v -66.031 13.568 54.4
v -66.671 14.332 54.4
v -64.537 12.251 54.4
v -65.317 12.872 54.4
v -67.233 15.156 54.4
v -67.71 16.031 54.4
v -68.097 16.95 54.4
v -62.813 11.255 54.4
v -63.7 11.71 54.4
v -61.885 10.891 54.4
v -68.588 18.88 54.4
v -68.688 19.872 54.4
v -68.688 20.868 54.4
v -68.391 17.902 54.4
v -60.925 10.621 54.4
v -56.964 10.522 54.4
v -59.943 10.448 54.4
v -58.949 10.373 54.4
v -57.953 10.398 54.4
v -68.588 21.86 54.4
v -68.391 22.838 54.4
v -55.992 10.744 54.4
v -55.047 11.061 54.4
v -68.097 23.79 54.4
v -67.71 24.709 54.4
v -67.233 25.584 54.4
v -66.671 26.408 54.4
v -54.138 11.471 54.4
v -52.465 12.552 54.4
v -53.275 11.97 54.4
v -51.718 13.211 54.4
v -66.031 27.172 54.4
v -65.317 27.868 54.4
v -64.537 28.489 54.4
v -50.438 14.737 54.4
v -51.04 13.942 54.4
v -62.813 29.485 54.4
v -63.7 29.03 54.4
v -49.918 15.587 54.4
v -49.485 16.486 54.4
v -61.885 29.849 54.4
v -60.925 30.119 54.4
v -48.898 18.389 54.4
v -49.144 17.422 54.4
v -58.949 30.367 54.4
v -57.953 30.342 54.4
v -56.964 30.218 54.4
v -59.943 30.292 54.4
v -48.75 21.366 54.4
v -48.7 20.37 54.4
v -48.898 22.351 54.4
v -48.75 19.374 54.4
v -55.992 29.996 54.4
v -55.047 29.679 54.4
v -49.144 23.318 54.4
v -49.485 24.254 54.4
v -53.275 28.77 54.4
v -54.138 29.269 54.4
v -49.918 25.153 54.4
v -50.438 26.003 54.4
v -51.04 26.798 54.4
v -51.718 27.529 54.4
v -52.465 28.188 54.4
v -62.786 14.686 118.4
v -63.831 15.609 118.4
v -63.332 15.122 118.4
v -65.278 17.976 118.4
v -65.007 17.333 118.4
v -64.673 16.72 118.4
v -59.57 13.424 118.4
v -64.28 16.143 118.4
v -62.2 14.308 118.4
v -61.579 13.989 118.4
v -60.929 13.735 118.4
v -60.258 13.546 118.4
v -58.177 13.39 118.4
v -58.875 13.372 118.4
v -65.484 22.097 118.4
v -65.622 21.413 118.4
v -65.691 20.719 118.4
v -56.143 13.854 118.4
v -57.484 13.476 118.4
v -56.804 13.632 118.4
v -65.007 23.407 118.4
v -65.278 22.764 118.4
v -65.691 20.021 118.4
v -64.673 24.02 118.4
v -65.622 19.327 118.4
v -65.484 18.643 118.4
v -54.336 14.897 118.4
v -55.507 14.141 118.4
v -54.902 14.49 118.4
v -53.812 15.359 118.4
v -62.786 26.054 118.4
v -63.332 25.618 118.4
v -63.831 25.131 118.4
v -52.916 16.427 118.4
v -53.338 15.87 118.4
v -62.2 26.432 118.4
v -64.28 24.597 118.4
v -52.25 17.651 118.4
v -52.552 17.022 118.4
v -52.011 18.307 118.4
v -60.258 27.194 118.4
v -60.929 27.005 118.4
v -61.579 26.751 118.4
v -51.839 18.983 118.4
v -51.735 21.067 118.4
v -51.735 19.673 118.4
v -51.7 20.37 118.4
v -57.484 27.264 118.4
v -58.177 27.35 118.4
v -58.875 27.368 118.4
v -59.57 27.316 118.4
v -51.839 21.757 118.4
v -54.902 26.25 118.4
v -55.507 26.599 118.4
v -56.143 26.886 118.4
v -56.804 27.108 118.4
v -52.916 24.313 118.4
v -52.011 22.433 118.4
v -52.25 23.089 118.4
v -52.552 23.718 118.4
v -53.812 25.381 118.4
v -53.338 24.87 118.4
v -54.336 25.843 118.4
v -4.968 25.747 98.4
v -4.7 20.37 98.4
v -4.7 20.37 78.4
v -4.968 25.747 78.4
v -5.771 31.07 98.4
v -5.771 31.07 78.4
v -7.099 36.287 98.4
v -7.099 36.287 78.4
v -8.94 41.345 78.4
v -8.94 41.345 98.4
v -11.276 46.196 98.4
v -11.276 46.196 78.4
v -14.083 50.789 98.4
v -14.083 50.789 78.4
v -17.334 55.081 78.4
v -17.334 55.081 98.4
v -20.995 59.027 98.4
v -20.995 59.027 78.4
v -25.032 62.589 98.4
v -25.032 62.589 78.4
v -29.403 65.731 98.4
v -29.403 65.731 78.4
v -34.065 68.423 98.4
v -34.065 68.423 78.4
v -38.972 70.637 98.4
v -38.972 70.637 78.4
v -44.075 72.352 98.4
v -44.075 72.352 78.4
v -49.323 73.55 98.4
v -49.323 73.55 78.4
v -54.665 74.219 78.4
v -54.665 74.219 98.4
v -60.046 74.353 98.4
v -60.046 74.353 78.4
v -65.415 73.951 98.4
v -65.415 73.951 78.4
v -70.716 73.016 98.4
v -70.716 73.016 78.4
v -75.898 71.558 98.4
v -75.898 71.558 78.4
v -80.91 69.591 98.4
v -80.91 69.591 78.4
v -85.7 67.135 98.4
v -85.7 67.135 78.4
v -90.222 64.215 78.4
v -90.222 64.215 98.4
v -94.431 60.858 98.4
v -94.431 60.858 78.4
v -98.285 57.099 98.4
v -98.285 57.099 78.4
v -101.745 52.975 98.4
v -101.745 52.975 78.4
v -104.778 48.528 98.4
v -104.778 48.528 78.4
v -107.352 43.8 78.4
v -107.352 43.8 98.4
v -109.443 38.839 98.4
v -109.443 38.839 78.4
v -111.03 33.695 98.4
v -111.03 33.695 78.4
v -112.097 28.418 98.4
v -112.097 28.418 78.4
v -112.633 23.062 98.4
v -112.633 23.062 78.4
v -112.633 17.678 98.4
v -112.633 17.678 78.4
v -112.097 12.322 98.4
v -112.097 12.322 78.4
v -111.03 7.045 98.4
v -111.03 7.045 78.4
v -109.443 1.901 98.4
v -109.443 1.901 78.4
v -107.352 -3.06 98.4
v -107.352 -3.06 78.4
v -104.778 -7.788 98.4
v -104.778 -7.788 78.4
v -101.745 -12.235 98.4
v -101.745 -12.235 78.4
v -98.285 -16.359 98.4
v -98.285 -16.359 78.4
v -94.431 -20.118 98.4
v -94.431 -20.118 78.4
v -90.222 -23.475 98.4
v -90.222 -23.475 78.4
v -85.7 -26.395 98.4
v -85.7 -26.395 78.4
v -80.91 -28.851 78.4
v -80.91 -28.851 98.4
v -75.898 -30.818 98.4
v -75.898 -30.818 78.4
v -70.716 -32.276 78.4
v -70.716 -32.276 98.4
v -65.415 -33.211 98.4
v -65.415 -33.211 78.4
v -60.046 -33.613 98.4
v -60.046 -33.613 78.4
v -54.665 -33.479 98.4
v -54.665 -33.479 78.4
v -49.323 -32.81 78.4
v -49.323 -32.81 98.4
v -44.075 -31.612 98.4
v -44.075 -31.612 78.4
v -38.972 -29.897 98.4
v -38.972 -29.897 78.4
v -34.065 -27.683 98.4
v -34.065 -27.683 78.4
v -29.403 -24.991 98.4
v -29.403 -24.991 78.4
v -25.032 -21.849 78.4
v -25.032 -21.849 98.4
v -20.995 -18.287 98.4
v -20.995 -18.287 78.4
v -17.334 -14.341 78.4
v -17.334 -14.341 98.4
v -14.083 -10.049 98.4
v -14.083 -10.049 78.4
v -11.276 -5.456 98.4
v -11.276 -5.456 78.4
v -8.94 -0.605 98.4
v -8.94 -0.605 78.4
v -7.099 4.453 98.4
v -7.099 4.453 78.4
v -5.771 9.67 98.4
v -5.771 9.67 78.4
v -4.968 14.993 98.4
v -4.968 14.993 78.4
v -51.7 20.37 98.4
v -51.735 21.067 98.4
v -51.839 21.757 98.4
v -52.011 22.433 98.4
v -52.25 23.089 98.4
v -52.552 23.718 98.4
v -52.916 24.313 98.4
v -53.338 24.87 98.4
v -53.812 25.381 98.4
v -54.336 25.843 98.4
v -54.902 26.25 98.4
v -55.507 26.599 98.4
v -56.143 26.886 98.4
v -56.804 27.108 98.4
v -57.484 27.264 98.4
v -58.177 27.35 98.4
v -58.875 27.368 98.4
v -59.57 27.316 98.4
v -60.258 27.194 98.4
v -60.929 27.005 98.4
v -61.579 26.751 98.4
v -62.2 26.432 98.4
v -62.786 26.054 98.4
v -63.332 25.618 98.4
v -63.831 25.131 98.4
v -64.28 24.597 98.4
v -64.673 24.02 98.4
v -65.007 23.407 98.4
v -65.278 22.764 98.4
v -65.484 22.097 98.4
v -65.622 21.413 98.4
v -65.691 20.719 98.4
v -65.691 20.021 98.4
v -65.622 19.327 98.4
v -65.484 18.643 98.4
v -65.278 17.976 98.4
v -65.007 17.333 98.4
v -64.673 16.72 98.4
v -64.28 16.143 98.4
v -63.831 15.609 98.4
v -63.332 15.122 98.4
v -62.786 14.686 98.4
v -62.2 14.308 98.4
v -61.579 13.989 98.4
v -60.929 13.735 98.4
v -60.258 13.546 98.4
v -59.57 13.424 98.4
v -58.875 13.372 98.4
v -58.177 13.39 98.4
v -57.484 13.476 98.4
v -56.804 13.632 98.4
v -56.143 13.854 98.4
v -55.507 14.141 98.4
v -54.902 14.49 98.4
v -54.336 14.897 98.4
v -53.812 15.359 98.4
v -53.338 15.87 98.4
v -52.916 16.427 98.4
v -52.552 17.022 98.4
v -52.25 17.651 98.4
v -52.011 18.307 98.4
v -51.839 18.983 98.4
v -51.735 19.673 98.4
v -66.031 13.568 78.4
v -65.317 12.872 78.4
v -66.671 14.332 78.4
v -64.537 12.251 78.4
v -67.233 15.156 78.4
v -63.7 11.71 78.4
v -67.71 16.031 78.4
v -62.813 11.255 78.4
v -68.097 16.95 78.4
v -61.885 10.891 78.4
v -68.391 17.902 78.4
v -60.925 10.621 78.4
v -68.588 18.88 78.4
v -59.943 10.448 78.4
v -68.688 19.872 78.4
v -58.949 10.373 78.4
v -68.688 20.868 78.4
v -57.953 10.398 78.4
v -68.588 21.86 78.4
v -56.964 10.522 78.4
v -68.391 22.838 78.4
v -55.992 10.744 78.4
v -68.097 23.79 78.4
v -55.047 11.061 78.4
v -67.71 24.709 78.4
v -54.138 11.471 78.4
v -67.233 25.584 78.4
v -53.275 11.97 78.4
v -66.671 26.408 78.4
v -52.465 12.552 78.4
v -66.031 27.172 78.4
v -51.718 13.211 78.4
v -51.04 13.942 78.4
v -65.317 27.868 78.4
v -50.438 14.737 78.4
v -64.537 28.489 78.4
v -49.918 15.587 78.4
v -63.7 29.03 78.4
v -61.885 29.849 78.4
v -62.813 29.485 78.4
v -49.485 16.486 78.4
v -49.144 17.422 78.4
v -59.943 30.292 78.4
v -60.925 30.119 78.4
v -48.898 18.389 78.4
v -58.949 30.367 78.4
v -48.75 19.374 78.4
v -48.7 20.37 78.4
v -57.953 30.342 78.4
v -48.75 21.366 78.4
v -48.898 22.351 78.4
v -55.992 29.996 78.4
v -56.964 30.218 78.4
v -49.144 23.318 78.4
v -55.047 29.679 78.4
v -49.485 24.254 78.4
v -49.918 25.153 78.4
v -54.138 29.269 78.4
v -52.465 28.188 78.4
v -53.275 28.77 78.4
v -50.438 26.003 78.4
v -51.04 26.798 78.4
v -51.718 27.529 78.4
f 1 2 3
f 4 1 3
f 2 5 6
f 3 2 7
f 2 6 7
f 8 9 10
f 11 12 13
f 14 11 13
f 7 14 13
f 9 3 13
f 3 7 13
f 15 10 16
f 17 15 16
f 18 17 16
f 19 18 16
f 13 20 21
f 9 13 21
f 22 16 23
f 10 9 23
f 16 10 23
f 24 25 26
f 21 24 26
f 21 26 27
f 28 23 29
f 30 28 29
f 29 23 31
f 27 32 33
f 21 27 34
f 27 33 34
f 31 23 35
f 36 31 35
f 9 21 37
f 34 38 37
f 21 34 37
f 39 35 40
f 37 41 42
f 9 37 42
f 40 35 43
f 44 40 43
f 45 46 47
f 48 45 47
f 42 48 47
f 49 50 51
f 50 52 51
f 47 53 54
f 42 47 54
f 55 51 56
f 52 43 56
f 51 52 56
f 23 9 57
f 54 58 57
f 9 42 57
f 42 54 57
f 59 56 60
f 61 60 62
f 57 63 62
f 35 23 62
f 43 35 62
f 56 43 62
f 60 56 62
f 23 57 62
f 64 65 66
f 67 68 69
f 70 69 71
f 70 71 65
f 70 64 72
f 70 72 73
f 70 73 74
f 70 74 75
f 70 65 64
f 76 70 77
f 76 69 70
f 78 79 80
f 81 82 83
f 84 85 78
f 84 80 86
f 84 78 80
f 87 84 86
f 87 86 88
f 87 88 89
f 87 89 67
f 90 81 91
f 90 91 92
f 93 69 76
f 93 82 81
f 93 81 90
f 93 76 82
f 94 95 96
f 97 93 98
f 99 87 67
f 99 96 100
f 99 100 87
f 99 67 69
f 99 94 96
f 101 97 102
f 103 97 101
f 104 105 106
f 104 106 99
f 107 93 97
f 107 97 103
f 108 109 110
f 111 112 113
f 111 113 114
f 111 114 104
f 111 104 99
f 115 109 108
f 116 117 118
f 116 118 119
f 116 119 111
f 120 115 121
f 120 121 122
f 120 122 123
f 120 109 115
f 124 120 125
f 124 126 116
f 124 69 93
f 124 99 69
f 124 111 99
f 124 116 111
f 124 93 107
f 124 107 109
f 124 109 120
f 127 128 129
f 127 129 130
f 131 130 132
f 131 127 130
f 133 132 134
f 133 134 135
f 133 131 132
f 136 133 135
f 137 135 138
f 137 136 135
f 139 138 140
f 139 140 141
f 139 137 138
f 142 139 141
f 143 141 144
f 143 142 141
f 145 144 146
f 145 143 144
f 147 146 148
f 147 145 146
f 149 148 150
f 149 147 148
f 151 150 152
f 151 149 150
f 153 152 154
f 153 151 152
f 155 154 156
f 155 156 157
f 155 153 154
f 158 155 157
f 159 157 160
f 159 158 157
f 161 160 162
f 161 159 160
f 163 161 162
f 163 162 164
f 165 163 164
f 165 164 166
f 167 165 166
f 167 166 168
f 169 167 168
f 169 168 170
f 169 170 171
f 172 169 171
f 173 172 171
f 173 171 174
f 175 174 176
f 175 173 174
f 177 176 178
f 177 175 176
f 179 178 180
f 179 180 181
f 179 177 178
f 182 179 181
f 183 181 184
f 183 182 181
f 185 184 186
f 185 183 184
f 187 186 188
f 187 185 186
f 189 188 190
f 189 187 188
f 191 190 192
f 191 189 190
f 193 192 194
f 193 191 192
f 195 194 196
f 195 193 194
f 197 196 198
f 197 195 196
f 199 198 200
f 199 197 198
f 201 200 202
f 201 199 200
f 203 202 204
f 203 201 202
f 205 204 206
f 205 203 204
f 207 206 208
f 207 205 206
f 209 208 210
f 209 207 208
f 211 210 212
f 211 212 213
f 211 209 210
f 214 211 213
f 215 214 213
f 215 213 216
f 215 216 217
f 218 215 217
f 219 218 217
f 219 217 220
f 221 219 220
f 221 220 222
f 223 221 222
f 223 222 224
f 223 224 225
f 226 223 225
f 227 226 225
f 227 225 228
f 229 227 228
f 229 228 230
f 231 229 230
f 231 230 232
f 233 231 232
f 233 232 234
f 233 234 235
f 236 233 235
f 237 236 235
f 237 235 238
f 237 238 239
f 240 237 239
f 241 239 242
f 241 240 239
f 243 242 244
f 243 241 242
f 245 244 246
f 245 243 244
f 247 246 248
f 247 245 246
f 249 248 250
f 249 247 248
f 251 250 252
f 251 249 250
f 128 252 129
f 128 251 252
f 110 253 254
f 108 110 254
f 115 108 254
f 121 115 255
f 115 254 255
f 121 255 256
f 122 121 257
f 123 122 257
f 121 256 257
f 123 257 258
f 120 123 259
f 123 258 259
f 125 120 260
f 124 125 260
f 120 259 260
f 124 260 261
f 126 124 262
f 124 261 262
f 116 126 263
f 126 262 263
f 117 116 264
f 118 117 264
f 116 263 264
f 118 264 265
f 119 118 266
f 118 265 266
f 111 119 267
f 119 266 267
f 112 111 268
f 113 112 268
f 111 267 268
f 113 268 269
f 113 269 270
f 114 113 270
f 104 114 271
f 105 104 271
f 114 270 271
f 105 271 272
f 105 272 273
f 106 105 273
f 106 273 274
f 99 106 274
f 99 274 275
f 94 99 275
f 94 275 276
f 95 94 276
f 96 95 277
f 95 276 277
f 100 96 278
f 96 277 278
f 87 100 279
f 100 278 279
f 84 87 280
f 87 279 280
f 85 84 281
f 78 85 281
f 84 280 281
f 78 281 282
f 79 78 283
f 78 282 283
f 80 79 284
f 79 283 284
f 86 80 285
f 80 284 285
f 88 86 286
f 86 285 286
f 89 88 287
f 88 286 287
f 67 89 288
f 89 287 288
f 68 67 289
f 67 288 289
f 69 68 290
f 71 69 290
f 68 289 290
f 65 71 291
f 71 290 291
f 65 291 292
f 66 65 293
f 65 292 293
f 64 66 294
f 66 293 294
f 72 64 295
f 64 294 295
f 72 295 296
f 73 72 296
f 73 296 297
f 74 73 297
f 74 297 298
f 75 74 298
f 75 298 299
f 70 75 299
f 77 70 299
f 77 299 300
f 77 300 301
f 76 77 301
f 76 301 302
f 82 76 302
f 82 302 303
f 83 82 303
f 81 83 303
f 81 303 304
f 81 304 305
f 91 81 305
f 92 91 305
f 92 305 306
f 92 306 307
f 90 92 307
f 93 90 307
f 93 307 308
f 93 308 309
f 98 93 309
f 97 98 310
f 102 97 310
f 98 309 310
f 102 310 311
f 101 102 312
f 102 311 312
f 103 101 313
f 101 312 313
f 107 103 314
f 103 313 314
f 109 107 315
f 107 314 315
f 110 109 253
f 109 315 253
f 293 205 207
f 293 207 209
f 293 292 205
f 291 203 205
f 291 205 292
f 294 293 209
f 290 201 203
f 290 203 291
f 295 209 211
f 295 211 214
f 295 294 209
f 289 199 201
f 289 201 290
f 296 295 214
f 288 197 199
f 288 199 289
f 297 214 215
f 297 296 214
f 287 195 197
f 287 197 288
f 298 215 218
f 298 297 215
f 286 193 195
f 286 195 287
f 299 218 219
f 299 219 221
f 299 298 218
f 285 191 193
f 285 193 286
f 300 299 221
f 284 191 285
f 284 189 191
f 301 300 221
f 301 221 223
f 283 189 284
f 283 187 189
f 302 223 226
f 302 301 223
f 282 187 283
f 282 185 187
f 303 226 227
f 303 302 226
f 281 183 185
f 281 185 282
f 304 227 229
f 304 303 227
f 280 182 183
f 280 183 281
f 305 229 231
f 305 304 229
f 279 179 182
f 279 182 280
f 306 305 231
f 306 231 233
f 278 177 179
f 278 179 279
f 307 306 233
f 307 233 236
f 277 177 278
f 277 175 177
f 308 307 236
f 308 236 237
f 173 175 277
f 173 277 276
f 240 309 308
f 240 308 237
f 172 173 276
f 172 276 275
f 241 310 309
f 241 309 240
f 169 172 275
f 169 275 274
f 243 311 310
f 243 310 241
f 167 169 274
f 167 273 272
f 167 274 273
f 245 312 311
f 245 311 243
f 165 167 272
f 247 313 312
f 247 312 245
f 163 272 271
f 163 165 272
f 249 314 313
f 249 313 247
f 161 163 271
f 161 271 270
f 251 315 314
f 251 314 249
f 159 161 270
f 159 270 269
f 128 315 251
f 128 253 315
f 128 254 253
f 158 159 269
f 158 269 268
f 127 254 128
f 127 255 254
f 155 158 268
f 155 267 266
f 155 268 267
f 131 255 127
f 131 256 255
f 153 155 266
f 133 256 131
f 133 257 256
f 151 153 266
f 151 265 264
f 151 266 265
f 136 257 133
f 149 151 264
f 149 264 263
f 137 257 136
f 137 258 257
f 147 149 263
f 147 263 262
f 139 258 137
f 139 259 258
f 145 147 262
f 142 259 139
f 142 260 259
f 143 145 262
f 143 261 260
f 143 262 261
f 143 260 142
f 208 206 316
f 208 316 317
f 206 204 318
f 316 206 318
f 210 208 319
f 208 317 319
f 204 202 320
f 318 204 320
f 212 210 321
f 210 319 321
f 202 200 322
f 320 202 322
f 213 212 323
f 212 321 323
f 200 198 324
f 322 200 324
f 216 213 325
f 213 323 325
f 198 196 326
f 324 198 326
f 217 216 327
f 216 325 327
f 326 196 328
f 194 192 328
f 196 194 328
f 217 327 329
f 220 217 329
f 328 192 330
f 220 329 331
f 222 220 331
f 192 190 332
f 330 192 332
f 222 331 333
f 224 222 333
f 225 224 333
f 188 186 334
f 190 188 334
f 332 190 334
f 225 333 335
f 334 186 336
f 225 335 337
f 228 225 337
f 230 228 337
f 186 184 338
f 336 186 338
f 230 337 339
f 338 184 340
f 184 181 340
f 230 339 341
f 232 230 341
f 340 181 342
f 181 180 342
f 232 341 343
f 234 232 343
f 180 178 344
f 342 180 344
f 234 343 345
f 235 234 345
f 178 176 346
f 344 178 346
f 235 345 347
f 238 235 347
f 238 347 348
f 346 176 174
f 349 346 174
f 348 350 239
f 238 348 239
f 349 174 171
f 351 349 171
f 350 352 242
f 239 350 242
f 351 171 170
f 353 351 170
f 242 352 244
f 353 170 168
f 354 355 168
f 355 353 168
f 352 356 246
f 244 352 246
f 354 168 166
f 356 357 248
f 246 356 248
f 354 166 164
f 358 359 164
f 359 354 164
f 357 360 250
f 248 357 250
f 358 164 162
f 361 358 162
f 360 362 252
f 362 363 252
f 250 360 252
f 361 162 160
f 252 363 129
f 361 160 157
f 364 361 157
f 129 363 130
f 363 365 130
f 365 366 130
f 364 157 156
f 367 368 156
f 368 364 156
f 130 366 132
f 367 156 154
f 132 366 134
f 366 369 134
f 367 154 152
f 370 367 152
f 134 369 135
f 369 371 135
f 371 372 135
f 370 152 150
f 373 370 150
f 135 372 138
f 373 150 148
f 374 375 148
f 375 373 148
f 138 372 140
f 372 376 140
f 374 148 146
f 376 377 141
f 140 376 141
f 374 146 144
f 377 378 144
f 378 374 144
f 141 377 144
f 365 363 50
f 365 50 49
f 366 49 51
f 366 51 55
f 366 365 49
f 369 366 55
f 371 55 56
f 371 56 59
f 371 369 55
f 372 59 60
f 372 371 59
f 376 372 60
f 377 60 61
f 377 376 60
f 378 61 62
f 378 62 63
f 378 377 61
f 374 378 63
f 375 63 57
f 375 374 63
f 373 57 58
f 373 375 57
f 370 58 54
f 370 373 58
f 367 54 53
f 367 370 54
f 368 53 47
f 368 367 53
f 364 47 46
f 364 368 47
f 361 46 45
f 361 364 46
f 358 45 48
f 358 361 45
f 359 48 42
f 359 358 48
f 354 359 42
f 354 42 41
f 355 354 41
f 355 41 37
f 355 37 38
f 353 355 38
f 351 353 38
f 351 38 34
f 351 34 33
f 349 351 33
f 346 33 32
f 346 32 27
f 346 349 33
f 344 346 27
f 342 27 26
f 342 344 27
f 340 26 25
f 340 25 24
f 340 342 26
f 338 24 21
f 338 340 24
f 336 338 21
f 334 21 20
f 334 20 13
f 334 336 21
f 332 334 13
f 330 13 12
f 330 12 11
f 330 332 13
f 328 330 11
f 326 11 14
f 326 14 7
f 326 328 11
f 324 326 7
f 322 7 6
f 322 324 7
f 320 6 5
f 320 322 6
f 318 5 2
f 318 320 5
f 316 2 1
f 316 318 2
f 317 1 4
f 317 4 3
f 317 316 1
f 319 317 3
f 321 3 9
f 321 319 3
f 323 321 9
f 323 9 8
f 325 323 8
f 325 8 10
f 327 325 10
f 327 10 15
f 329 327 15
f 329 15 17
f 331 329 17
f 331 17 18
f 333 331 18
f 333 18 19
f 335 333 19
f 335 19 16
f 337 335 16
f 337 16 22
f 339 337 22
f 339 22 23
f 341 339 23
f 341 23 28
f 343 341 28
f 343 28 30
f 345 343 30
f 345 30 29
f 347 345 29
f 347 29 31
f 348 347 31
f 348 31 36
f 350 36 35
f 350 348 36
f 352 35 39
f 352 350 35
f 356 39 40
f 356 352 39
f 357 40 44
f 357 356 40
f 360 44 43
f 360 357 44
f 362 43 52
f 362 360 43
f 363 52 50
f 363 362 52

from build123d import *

# Parameters (mm, degrees)
SKETCH004_R           = 54
EXTRUDE004_DEPTH      = 20
SKETCH003_R           = 10
EXTRUDE003_DEPTH      = 30
EXTRUDE003_DEPTH_BACK = 14
SKETCH005_R           = 7
EXTRUDE005_DEPTH      = 20


with BuildPart() as outercylinder:
    # Sketch004 (on Face3 of Extrude003) → Extrude004 (new body)
    with BuildSketch(Plane.XY.offset(98.4)):
        with Locations((-58.7, 20.37)):
            Circle(SKETCH004_R)
    extrude(amount=-EXTRUDE004_DEPTH)


with BuildPart() as innercylinder:
    # Sketch003 (on Face4 of Extrude002) → Extrude003 (new body, two sides)
    with BuildSketch(Plane.XY.offset(68.4)) as extrude003_sk:
        with Locations((-58.7, 20.37)):
            Circle(SKETCH003_R)
    extrude(amount=EXTRUDE003_DEPTH)
    extrude(extrude003_sk.sketch, amount=-EXTRUDE003_DEPTH_BACK)


with BuildPart() as motoradapter:
    # Sketch005 (on Face3 of Extrude003) → Extrude005 (new body)
    with BuildSketch(Plane.XY.offset(98.4)):
        with Locations((-58.7, 20.37)):
            Circle(SKETCH005_R)
    extrude(amount=EXTRUDE005_DEPTH)

    # Fusion005: union outerCylinder, innerCylinder
    add(outercylinder.part)
    add(innercylinder.part)


solid = motoradapter.part
